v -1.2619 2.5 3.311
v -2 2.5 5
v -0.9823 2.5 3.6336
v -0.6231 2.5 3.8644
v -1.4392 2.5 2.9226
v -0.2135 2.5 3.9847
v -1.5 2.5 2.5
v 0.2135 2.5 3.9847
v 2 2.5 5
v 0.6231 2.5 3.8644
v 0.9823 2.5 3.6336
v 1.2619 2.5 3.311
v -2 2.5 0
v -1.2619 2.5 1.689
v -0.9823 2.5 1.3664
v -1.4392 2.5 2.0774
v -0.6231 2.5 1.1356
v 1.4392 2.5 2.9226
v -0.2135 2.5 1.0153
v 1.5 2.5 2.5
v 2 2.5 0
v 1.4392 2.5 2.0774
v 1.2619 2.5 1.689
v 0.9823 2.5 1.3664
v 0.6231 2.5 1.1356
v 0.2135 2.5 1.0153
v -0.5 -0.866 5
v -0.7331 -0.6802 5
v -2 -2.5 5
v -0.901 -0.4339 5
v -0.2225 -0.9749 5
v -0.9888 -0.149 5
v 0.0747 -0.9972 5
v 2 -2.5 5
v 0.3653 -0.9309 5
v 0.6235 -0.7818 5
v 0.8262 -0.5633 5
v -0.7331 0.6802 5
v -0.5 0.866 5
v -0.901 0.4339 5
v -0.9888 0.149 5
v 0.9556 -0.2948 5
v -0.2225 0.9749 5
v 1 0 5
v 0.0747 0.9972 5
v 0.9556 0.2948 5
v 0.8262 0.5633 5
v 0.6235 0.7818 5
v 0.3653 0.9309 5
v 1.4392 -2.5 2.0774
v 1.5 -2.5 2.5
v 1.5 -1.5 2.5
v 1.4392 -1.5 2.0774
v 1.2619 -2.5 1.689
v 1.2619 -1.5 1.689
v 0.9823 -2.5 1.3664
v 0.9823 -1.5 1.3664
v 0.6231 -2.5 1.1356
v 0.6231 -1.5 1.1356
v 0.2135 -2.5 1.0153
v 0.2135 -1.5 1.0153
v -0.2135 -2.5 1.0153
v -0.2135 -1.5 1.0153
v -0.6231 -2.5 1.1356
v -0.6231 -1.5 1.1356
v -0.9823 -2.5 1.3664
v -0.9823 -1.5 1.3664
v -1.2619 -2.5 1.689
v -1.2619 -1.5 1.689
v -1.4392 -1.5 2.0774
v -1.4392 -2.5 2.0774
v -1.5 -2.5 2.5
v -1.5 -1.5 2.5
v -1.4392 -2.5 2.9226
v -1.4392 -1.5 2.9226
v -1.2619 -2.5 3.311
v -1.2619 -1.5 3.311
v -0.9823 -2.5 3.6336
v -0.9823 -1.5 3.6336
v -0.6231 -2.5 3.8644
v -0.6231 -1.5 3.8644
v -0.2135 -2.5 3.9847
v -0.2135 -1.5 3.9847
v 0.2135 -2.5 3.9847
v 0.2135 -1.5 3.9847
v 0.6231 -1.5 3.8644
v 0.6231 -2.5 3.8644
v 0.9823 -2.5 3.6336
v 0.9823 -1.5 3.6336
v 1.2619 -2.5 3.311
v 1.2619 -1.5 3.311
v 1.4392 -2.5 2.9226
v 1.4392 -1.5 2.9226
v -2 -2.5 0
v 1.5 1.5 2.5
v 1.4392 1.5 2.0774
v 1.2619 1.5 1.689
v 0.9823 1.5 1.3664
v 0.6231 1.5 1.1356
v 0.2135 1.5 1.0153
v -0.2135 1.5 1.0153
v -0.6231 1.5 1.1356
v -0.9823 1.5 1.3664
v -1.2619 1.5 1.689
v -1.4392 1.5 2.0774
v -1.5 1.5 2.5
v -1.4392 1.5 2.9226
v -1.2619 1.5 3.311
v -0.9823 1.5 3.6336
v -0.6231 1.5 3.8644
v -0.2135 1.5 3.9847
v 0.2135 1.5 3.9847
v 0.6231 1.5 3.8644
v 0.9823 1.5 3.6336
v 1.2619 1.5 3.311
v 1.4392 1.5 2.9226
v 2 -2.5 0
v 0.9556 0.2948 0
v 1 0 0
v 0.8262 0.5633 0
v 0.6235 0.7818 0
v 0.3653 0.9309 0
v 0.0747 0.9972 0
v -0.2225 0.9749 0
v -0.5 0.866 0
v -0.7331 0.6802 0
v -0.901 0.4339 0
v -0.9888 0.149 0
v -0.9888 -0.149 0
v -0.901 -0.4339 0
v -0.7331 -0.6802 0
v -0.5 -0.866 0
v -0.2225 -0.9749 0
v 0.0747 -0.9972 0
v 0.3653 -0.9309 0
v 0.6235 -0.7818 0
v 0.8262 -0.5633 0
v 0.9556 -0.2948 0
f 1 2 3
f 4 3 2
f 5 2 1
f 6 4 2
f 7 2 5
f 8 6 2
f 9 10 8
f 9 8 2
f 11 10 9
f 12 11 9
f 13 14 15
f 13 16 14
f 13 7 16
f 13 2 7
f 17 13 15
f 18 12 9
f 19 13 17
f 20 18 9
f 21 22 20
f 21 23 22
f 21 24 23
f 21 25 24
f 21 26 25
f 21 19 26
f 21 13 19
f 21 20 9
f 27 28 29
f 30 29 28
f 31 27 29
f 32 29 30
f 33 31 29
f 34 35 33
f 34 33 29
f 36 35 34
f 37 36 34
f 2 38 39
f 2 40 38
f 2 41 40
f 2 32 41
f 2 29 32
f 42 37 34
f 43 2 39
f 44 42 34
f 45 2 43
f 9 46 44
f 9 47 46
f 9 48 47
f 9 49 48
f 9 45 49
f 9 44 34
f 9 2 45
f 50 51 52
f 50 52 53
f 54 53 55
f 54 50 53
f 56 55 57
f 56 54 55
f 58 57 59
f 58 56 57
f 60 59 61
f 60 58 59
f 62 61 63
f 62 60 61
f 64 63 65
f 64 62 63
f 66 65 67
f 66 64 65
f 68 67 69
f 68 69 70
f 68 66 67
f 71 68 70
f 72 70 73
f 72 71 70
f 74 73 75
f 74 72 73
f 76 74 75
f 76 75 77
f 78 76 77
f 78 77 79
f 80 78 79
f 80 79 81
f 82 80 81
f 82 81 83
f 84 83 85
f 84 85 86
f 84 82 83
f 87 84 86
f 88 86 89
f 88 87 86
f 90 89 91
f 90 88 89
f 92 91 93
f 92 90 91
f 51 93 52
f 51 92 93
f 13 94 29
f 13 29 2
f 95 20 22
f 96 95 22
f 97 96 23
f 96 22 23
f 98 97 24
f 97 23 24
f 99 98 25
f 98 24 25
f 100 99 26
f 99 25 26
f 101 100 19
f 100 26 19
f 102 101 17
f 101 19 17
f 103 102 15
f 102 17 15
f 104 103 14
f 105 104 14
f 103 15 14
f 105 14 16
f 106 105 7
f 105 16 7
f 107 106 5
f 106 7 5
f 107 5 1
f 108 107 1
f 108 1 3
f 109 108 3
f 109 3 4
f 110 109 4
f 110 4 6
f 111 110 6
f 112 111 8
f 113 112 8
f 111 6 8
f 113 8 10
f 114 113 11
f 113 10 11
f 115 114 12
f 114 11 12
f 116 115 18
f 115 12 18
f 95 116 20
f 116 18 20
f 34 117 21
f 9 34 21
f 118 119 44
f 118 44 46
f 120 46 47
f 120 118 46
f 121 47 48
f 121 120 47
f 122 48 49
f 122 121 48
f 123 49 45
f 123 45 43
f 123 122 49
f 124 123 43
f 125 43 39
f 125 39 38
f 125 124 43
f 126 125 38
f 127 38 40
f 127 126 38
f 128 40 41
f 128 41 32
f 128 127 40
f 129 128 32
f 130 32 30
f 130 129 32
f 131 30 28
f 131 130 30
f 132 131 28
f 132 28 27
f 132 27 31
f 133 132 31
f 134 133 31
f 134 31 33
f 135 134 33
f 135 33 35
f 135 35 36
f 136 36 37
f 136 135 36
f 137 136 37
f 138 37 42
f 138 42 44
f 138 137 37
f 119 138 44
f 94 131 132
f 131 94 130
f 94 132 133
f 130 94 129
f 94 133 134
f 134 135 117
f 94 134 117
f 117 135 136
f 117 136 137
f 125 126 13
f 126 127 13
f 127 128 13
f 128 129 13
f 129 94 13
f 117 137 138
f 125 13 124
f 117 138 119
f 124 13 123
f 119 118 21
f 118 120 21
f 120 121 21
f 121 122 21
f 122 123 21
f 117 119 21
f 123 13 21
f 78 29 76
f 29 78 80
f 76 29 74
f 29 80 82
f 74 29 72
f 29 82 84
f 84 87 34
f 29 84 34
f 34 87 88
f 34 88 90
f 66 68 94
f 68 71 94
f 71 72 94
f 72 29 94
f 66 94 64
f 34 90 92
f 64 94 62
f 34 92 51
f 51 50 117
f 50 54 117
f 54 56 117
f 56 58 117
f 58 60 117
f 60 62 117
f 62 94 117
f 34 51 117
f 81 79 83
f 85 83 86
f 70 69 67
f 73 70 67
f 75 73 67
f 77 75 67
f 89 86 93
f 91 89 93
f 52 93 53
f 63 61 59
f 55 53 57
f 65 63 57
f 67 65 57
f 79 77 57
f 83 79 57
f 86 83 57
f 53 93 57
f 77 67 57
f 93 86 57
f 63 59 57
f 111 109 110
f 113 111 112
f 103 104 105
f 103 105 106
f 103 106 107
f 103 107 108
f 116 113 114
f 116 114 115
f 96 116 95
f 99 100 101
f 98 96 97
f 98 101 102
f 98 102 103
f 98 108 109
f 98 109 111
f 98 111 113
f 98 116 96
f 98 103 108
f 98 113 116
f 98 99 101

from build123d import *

# Parameters (mm, degrees)
CROQUIS1_W              = 4
CROQUIS1_H              = 5
CROQUIS1_R              = 1
SALIENTE_EXTRUIR1_DEPTH = 5
CROQUIS3_R              = 1.5
CORTAR_EXTRUIR1_DEPTH   = 1


with BuildPart() as part:
    # Croquis1 → Saliente-Extruir1 (new body)
    with BuildSketch(Plane.XY):
        Rectangle(CROQUIS1_W, CROQUIS1_H)
        Circle(CROQUIS1_R, mode=Mode.SUBTRACT)
    extrude(amount=SALIENTE_EXTRUIR1_DEPTH)

    # Croquis3 → Cortar-Extruir1 (cut)
    with BuildSketch(Plane(origin=(0, 2.5, 0), x_dir=(1, 0, 0), z_dir=(0, 1, 0))):
        with Locations((0, -2.5)):
            Circle(CROQUIS3_R)
    cortar_extruir1 = extrude(amount=-CORTAR_EXTRUIR1_DEPTH, mode=Mode.SUBTRACT)

    # Simetría1: Cortar-Extruir1 across plane
    add(cortar_extruir1.mirror(Plane(origin=(0, 0, 0), x_dir=(0, 0, 1), z_dir=(0, -1, 0))), mode=Mode.SUBTRACT)


solid = part.part
